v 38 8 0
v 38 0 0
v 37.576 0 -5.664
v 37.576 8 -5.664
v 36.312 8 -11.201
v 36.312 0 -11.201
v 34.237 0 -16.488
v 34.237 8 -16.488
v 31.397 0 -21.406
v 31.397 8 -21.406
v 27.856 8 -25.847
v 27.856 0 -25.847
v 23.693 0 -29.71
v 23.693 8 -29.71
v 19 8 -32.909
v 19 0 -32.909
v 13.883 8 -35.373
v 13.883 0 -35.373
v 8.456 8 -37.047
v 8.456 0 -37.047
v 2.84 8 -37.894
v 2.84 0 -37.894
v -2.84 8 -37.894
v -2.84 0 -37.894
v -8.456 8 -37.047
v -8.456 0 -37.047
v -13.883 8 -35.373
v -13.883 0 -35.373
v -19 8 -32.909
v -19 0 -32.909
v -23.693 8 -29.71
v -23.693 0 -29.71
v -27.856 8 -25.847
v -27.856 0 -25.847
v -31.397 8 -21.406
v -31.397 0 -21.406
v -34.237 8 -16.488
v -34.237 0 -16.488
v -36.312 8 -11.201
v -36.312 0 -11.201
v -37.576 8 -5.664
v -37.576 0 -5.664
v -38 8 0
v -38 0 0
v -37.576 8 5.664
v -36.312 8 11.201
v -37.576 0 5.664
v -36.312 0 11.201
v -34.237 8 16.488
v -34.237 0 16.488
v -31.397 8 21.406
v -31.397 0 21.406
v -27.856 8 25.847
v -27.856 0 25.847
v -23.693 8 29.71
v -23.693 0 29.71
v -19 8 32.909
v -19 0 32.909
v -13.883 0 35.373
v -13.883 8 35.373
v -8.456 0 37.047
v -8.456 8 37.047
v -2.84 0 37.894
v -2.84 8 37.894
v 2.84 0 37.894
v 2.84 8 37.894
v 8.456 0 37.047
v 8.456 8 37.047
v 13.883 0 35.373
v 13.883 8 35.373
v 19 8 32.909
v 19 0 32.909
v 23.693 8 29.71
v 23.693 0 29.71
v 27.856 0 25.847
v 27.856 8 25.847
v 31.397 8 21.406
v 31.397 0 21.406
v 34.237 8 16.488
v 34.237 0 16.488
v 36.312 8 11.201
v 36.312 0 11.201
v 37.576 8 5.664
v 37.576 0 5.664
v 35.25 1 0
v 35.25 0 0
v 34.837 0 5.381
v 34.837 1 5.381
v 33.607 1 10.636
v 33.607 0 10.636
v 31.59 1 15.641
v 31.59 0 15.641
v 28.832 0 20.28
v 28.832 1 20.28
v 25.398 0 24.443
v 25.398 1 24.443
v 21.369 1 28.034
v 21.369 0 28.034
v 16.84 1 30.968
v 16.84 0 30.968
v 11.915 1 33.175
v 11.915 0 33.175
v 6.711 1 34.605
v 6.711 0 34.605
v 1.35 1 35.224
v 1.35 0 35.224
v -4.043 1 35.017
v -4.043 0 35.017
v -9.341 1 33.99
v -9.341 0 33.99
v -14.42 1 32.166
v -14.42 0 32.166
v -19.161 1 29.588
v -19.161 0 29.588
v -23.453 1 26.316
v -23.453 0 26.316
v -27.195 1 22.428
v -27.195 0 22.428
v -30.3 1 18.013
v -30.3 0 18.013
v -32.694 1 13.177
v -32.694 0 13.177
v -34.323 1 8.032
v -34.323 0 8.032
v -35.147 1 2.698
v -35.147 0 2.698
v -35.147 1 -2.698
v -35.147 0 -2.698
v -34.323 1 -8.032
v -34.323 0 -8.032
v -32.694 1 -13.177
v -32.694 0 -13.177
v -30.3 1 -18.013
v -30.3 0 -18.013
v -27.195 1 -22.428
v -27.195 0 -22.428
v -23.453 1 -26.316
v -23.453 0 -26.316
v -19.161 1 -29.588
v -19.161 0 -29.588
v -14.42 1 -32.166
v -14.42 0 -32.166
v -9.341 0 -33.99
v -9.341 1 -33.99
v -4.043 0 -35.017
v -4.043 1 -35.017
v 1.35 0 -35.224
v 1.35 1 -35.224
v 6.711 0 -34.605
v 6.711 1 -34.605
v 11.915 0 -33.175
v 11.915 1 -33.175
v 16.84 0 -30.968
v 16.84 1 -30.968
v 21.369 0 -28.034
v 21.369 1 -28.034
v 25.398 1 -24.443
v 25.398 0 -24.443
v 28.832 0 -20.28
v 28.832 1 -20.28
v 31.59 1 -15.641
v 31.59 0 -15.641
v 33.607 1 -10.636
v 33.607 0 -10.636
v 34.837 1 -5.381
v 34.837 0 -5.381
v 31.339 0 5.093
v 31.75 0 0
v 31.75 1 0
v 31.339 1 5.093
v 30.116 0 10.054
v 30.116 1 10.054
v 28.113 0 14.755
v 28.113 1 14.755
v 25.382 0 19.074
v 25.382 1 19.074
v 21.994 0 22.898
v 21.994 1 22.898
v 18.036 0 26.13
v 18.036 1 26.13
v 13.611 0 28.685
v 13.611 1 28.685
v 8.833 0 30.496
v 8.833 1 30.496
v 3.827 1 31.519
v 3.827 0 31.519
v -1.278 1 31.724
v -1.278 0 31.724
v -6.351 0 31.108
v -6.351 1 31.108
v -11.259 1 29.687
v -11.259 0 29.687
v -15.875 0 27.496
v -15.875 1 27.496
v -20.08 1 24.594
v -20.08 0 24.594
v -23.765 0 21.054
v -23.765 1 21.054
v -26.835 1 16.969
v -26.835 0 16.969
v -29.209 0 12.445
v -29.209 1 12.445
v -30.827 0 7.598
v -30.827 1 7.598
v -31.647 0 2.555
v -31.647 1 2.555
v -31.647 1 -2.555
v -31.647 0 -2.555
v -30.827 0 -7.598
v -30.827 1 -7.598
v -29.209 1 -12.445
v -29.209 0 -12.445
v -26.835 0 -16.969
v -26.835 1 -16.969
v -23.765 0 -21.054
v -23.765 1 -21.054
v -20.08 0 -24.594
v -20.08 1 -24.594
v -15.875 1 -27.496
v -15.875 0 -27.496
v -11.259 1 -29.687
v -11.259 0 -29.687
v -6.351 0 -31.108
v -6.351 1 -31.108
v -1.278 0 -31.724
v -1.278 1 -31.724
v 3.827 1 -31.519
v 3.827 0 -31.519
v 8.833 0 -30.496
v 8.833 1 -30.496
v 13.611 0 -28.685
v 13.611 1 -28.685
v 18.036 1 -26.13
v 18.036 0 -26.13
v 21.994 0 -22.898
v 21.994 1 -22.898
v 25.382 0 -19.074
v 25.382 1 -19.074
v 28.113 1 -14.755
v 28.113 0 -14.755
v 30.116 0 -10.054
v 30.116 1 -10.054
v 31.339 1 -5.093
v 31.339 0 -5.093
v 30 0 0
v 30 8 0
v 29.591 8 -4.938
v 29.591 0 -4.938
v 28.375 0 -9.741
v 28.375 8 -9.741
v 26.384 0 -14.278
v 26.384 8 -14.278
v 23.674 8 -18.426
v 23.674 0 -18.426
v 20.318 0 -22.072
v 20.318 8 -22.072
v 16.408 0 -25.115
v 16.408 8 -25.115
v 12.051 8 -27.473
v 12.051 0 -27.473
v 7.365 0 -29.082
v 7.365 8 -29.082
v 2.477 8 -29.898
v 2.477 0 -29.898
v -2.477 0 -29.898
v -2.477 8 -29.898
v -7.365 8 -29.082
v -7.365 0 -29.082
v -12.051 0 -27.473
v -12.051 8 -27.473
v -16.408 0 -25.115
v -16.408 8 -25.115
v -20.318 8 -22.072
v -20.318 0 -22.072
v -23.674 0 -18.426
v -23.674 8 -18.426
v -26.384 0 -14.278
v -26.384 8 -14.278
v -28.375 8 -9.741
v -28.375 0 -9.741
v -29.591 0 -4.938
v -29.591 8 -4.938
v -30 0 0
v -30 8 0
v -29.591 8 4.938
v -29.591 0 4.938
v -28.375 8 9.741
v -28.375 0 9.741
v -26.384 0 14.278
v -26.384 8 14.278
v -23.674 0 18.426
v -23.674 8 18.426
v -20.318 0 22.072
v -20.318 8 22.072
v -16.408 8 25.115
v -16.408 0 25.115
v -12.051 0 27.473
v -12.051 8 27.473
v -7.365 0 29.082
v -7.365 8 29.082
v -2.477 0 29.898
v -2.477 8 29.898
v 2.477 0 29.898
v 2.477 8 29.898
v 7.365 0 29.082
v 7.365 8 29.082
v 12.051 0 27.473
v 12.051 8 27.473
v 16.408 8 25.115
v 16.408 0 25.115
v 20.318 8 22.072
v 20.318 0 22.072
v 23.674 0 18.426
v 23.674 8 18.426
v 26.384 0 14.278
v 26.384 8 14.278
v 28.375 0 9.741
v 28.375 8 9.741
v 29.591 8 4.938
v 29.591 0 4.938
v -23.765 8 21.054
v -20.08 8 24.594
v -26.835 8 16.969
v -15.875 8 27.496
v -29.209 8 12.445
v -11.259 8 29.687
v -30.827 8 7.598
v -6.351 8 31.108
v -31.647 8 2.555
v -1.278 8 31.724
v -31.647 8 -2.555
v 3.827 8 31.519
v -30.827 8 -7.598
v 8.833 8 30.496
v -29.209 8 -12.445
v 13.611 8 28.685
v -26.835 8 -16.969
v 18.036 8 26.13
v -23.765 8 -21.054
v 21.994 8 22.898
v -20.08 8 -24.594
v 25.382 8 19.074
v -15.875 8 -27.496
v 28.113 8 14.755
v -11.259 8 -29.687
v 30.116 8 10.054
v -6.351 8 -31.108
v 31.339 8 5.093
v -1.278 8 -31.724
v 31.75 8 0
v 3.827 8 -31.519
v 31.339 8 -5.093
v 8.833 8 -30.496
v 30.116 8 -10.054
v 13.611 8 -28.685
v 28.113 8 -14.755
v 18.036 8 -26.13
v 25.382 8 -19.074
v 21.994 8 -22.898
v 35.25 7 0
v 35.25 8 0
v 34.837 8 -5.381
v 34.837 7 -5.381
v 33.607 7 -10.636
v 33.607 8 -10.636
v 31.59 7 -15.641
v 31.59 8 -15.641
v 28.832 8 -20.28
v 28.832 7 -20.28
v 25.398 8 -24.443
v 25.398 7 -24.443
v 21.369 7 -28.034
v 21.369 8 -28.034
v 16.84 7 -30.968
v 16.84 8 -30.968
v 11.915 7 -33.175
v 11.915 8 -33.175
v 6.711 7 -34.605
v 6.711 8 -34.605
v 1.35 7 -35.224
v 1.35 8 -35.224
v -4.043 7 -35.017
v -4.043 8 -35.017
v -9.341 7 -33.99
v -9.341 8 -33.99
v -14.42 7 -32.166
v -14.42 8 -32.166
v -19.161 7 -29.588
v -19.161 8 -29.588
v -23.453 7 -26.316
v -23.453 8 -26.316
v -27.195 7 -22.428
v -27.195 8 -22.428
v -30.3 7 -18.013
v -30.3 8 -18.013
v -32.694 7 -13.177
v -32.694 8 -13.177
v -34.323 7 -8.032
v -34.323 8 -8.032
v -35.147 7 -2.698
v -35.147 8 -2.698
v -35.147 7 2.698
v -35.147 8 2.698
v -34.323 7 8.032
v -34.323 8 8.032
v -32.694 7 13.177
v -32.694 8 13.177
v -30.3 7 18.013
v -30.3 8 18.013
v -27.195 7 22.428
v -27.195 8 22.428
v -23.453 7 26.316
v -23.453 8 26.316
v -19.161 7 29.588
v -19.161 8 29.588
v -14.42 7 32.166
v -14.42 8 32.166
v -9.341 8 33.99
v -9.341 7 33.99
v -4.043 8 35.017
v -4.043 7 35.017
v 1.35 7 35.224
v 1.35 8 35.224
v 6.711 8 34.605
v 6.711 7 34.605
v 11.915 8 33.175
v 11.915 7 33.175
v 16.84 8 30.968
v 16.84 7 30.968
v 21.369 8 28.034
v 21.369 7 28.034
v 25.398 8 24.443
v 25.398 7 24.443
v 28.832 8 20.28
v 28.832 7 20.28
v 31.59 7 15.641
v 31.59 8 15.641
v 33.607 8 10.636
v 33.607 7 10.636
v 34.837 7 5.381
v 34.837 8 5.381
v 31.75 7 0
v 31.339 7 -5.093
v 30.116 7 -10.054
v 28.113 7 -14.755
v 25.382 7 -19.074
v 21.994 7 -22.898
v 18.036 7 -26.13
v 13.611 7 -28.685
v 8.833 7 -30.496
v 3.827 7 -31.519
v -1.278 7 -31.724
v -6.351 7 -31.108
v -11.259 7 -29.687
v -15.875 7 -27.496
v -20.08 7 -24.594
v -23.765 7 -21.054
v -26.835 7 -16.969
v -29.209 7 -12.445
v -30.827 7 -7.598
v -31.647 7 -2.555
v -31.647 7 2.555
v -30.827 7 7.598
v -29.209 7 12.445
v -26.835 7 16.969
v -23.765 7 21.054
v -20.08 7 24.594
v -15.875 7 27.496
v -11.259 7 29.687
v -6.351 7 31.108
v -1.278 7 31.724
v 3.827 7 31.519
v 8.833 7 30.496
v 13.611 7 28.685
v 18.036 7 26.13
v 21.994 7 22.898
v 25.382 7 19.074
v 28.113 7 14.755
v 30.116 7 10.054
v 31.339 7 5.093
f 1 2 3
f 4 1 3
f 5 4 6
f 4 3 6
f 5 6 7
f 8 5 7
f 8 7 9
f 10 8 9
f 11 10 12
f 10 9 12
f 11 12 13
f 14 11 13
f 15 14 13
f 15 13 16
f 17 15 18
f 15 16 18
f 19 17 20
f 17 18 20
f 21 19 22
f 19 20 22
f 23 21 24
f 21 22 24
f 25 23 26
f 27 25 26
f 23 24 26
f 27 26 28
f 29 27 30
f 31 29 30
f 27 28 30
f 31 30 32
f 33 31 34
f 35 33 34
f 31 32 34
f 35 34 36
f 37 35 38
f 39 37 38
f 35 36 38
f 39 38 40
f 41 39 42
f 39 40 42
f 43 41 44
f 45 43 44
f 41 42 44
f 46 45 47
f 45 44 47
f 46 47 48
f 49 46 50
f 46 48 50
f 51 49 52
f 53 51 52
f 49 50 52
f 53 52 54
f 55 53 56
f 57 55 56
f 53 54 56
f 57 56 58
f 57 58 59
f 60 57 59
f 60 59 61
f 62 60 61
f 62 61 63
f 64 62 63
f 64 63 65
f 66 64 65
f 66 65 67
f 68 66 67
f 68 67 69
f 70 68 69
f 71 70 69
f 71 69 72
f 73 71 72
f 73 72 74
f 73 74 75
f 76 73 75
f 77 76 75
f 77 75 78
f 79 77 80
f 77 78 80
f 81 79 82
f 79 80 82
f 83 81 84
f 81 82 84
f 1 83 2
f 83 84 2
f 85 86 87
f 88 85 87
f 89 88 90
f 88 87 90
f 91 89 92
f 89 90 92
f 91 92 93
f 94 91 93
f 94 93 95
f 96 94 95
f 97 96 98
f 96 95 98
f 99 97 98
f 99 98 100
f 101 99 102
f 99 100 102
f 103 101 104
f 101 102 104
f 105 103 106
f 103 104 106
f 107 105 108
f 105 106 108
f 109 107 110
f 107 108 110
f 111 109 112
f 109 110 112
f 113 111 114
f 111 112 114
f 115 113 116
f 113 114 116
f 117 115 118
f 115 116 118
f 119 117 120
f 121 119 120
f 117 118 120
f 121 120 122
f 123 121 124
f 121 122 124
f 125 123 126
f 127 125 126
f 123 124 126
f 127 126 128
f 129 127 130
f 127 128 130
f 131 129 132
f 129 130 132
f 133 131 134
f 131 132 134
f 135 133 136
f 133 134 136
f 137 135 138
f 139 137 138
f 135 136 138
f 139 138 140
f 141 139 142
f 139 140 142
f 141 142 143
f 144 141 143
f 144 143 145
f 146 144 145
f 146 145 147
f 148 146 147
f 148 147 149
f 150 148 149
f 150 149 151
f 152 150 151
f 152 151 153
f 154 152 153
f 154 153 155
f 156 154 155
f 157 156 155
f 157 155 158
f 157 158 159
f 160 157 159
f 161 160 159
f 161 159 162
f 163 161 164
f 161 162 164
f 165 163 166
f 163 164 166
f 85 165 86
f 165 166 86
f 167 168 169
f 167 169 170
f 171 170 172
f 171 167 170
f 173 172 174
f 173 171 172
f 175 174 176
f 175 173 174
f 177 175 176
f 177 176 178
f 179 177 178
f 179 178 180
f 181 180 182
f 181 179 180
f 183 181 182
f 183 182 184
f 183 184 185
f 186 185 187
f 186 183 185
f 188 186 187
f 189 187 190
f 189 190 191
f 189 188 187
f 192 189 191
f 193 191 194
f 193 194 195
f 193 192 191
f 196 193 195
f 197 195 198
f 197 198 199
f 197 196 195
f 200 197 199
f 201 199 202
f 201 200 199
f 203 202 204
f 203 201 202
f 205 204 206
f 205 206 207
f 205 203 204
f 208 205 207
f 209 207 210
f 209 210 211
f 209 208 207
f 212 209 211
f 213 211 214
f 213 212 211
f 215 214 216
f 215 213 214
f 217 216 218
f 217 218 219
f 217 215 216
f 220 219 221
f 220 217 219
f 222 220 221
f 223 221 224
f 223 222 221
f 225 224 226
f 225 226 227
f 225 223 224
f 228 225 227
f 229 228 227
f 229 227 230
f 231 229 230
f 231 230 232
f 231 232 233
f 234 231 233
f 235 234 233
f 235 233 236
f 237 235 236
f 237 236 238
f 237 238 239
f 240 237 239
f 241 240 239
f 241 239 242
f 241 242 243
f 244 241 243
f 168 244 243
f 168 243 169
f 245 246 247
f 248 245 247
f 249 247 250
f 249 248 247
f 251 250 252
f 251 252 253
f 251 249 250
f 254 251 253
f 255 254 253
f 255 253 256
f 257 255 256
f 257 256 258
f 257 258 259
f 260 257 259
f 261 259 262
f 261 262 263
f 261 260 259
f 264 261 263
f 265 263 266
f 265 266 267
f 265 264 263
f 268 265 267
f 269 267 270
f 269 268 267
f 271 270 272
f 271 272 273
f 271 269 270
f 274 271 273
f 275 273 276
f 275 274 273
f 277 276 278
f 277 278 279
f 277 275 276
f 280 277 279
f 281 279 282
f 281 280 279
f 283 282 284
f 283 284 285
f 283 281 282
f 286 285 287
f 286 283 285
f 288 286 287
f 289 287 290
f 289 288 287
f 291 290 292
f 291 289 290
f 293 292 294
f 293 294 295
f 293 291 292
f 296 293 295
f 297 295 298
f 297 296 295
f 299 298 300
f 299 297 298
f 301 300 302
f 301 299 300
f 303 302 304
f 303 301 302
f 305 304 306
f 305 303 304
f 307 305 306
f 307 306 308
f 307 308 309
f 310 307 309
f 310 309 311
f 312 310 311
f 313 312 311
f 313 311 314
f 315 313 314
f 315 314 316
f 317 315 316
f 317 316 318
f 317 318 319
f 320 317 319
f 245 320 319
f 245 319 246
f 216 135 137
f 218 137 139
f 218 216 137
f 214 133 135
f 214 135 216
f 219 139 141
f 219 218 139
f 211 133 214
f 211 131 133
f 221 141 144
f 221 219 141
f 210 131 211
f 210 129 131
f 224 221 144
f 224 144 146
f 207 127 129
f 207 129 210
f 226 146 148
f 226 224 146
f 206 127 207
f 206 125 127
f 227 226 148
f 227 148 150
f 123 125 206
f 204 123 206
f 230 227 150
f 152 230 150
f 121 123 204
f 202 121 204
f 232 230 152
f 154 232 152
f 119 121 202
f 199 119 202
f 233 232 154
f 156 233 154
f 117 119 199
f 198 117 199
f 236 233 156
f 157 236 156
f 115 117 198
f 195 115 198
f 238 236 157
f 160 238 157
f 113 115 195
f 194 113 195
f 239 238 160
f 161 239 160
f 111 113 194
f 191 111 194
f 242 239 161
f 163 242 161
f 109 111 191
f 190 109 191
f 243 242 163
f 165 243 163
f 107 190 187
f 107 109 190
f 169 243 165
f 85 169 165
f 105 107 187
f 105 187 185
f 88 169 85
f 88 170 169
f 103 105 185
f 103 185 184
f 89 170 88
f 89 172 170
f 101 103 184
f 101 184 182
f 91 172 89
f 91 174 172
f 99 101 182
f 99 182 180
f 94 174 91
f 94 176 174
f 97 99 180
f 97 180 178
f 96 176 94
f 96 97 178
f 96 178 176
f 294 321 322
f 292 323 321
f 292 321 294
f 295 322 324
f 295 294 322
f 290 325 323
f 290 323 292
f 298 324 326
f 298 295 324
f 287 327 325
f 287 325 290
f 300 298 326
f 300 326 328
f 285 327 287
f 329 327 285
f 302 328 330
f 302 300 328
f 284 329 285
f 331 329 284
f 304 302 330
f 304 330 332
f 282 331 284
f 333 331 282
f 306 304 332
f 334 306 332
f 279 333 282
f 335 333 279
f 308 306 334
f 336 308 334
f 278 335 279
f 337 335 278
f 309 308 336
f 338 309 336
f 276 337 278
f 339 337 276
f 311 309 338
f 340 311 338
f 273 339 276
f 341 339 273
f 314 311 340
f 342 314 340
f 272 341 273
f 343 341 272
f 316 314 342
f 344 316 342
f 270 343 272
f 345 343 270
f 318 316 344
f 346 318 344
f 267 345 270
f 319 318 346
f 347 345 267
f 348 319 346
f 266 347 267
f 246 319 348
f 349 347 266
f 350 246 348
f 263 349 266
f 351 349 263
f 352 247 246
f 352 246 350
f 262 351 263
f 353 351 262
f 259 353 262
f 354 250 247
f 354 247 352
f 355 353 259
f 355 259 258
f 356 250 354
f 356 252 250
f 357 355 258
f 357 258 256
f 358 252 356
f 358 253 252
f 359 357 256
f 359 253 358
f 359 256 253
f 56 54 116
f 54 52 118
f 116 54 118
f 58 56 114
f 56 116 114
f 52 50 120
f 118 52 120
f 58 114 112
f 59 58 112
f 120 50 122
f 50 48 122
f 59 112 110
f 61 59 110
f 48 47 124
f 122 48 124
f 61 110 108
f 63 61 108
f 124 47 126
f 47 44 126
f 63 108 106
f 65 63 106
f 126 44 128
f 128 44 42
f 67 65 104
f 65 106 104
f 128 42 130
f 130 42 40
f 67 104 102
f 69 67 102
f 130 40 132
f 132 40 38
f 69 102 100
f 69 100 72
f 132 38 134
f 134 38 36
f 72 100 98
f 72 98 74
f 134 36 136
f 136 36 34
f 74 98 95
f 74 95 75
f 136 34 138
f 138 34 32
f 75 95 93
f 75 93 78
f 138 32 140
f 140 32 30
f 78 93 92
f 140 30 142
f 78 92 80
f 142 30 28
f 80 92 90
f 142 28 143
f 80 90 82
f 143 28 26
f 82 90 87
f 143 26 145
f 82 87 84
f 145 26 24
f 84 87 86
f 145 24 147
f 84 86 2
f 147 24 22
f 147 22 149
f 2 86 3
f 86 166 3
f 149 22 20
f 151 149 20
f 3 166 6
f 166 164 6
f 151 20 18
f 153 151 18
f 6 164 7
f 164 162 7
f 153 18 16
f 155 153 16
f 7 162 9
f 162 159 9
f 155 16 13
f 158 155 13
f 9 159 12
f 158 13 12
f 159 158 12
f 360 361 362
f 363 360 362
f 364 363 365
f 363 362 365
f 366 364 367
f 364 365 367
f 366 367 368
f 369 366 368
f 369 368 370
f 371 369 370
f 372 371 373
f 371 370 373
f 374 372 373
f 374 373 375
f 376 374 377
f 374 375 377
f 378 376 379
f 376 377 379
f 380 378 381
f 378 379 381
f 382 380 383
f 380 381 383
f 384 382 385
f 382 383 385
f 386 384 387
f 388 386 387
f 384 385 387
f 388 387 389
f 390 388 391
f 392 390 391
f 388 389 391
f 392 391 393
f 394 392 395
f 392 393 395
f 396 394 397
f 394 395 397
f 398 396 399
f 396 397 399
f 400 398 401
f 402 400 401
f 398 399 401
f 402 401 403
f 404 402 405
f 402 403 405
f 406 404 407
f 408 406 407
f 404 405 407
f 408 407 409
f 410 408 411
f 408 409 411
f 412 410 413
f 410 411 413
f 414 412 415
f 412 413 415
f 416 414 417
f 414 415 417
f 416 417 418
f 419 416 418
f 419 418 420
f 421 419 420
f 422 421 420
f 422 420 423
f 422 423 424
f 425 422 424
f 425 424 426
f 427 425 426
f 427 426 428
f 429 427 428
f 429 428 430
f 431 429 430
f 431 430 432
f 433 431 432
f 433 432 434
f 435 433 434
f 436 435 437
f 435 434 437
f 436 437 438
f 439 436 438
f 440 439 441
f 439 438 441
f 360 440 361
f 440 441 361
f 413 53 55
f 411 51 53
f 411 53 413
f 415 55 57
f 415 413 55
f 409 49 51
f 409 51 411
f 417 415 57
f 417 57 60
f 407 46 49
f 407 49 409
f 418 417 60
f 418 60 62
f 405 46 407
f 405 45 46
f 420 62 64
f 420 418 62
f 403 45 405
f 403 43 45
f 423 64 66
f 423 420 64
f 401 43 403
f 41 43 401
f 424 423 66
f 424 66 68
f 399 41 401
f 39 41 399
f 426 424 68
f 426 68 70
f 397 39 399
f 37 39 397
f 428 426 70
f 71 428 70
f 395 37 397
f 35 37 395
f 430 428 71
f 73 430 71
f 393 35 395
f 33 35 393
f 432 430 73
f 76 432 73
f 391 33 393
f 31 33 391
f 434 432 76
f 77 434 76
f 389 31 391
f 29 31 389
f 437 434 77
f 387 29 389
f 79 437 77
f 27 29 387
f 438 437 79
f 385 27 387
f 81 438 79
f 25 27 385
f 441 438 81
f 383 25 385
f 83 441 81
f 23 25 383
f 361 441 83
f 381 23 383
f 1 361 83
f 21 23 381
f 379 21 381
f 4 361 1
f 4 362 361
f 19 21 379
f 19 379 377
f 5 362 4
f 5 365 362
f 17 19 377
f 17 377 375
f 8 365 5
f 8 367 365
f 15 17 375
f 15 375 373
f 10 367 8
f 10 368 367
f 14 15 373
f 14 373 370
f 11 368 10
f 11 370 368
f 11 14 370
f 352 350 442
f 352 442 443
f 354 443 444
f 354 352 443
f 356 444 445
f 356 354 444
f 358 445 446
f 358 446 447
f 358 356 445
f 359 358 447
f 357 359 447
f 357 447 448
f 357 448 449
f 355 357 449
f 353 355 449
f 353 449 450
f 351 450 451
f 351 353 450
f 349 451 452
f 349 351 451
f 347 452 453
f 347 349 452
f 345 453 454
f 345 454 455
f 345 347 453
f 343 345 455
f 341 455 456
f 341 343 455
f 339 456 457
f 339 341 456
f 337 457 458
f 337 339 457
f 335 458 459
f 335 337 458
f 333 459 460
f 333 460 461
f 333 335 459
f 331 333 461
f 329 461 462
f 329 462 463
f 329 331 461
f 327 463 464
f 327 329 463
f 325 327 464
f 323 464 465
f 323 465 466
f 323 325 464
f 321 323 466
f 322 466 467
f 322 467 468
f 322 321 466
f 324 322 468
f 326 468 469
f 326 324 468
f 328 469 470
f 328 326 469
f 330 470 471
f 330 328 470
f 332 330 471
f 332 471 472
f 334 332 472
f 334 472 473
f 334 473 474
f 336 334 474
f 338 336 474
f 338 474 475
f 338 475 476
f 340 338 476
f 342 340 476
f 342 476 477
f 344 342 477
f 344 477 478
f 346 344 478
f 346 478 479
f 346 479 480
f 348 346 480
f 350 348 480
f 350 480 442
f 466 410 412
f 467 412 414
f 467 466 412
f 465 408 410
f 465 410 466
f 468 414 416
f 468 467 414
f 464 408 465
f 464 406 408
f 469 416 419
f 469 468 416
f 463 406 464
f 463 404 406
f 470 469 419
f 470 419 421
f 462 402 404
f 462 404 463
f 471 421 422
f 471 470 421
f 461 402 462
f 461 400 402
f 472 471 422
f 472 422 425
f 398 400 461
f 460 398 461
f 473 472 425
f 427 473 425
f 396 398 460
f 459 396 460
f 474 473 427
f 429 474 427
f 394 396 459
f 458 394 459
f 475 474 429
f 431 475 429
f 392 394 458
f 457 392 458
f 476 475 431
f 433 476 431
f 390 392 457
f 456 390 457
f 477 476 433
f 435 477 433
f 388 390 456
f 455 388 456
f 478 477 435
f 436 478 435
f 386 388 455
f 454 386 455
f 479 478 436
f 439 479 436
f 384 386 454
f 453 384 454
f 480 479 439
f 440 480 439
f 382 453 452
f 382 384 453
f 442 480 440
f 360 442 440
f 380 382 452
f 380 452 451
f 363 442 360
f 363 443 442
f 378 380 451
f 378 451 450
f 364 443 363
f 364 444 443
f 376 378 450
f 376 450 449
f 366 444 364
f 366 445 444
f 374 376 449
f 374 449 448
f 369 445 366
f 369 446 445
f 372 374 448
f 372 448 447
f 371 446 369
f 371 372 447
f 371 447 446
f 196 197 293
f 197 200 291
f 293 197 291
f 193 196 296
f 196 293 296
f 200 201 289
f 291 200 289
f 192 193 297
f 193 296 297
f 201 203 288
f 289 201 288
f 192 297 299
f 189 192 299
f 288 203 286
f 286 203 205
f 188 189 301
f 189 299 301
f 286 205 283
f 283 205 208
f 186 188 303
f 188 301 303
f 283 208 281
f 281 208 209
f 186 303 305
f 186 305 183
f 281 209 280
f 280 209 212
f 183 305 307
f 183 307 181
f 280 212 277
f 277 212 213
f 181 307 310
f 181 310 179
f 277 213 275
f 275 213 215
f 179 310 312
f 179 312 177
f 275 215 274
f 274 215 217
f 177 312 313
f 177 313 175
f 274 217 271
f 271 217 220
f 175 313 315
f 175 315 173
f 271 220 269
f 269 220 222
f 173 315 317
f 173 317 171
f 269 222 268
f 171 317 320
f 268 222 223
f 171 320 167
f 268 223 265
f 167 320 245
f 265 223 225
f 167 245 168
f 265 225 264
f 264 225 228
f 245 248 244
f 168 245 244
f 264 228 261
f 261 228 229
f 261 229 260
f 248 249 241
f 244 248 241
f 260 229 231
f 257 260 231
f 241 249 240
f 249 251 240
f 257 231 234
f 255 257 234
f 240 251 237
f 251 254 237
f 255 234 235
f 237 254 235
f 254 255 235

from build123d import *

# Parameters (mm, degrees)
SKETCH_1_R          = 38
SKETCH_1_R_2        = 30
EXTRUDE_1_DEPTH     = 8
SKETCH_2_R          = 35.25
SKETCH_2_R_2        = 31.75
CUT_EXTRUDE_1_DEPTH = 1
SKETCH_3_R          = 35.25
SKETCH_3_R_2        = 31.75
CUT_EXTRUDE_2_DEPTH = 1


with BuildPart() as part:
    # 草图1 → 凸台-拉伸1 (new body)
    with BuildSketch(Plane(origin=(0, 0, 0), x_dir=(1, 0, 0), z_dir=(0, 1, 0))):
        Circle(SKETCH_1_R)
        Circle(SKETCH_1_R_2, mode=Mode.SUBTRACT)
    extrude(amount=EXTRUDE_1_DEPTH)

    # 草图2 → 切除-拉伸1 (cut)
    with BuildSketch(Plane(origin=(0, 8, 0), x_dir=(1, 0, 0), z_dir=(0, 1, 0))):
        Circle(SKETCH_2_R)
        Circle(SKETCH_2_R_2, mode=Mode.SUBTRACT)
    extrude(amount=-CUT_EXTRUDE_1_DEPTH, mode=Mode.SUBTRACT)

    # 草图3 → 切除-拉伸2 (cut)
    with BuildSketch(Plane.XZ):
        Circle(SKETCH_3_R)
        Circle(SKETCH_3_R_2, mode=Mode.SUBTRACT)
    extrude(amount=-CUT_EXTRUDE_2_DEPTH, mode=Mode.SUBTRACT)


solid = part.part
